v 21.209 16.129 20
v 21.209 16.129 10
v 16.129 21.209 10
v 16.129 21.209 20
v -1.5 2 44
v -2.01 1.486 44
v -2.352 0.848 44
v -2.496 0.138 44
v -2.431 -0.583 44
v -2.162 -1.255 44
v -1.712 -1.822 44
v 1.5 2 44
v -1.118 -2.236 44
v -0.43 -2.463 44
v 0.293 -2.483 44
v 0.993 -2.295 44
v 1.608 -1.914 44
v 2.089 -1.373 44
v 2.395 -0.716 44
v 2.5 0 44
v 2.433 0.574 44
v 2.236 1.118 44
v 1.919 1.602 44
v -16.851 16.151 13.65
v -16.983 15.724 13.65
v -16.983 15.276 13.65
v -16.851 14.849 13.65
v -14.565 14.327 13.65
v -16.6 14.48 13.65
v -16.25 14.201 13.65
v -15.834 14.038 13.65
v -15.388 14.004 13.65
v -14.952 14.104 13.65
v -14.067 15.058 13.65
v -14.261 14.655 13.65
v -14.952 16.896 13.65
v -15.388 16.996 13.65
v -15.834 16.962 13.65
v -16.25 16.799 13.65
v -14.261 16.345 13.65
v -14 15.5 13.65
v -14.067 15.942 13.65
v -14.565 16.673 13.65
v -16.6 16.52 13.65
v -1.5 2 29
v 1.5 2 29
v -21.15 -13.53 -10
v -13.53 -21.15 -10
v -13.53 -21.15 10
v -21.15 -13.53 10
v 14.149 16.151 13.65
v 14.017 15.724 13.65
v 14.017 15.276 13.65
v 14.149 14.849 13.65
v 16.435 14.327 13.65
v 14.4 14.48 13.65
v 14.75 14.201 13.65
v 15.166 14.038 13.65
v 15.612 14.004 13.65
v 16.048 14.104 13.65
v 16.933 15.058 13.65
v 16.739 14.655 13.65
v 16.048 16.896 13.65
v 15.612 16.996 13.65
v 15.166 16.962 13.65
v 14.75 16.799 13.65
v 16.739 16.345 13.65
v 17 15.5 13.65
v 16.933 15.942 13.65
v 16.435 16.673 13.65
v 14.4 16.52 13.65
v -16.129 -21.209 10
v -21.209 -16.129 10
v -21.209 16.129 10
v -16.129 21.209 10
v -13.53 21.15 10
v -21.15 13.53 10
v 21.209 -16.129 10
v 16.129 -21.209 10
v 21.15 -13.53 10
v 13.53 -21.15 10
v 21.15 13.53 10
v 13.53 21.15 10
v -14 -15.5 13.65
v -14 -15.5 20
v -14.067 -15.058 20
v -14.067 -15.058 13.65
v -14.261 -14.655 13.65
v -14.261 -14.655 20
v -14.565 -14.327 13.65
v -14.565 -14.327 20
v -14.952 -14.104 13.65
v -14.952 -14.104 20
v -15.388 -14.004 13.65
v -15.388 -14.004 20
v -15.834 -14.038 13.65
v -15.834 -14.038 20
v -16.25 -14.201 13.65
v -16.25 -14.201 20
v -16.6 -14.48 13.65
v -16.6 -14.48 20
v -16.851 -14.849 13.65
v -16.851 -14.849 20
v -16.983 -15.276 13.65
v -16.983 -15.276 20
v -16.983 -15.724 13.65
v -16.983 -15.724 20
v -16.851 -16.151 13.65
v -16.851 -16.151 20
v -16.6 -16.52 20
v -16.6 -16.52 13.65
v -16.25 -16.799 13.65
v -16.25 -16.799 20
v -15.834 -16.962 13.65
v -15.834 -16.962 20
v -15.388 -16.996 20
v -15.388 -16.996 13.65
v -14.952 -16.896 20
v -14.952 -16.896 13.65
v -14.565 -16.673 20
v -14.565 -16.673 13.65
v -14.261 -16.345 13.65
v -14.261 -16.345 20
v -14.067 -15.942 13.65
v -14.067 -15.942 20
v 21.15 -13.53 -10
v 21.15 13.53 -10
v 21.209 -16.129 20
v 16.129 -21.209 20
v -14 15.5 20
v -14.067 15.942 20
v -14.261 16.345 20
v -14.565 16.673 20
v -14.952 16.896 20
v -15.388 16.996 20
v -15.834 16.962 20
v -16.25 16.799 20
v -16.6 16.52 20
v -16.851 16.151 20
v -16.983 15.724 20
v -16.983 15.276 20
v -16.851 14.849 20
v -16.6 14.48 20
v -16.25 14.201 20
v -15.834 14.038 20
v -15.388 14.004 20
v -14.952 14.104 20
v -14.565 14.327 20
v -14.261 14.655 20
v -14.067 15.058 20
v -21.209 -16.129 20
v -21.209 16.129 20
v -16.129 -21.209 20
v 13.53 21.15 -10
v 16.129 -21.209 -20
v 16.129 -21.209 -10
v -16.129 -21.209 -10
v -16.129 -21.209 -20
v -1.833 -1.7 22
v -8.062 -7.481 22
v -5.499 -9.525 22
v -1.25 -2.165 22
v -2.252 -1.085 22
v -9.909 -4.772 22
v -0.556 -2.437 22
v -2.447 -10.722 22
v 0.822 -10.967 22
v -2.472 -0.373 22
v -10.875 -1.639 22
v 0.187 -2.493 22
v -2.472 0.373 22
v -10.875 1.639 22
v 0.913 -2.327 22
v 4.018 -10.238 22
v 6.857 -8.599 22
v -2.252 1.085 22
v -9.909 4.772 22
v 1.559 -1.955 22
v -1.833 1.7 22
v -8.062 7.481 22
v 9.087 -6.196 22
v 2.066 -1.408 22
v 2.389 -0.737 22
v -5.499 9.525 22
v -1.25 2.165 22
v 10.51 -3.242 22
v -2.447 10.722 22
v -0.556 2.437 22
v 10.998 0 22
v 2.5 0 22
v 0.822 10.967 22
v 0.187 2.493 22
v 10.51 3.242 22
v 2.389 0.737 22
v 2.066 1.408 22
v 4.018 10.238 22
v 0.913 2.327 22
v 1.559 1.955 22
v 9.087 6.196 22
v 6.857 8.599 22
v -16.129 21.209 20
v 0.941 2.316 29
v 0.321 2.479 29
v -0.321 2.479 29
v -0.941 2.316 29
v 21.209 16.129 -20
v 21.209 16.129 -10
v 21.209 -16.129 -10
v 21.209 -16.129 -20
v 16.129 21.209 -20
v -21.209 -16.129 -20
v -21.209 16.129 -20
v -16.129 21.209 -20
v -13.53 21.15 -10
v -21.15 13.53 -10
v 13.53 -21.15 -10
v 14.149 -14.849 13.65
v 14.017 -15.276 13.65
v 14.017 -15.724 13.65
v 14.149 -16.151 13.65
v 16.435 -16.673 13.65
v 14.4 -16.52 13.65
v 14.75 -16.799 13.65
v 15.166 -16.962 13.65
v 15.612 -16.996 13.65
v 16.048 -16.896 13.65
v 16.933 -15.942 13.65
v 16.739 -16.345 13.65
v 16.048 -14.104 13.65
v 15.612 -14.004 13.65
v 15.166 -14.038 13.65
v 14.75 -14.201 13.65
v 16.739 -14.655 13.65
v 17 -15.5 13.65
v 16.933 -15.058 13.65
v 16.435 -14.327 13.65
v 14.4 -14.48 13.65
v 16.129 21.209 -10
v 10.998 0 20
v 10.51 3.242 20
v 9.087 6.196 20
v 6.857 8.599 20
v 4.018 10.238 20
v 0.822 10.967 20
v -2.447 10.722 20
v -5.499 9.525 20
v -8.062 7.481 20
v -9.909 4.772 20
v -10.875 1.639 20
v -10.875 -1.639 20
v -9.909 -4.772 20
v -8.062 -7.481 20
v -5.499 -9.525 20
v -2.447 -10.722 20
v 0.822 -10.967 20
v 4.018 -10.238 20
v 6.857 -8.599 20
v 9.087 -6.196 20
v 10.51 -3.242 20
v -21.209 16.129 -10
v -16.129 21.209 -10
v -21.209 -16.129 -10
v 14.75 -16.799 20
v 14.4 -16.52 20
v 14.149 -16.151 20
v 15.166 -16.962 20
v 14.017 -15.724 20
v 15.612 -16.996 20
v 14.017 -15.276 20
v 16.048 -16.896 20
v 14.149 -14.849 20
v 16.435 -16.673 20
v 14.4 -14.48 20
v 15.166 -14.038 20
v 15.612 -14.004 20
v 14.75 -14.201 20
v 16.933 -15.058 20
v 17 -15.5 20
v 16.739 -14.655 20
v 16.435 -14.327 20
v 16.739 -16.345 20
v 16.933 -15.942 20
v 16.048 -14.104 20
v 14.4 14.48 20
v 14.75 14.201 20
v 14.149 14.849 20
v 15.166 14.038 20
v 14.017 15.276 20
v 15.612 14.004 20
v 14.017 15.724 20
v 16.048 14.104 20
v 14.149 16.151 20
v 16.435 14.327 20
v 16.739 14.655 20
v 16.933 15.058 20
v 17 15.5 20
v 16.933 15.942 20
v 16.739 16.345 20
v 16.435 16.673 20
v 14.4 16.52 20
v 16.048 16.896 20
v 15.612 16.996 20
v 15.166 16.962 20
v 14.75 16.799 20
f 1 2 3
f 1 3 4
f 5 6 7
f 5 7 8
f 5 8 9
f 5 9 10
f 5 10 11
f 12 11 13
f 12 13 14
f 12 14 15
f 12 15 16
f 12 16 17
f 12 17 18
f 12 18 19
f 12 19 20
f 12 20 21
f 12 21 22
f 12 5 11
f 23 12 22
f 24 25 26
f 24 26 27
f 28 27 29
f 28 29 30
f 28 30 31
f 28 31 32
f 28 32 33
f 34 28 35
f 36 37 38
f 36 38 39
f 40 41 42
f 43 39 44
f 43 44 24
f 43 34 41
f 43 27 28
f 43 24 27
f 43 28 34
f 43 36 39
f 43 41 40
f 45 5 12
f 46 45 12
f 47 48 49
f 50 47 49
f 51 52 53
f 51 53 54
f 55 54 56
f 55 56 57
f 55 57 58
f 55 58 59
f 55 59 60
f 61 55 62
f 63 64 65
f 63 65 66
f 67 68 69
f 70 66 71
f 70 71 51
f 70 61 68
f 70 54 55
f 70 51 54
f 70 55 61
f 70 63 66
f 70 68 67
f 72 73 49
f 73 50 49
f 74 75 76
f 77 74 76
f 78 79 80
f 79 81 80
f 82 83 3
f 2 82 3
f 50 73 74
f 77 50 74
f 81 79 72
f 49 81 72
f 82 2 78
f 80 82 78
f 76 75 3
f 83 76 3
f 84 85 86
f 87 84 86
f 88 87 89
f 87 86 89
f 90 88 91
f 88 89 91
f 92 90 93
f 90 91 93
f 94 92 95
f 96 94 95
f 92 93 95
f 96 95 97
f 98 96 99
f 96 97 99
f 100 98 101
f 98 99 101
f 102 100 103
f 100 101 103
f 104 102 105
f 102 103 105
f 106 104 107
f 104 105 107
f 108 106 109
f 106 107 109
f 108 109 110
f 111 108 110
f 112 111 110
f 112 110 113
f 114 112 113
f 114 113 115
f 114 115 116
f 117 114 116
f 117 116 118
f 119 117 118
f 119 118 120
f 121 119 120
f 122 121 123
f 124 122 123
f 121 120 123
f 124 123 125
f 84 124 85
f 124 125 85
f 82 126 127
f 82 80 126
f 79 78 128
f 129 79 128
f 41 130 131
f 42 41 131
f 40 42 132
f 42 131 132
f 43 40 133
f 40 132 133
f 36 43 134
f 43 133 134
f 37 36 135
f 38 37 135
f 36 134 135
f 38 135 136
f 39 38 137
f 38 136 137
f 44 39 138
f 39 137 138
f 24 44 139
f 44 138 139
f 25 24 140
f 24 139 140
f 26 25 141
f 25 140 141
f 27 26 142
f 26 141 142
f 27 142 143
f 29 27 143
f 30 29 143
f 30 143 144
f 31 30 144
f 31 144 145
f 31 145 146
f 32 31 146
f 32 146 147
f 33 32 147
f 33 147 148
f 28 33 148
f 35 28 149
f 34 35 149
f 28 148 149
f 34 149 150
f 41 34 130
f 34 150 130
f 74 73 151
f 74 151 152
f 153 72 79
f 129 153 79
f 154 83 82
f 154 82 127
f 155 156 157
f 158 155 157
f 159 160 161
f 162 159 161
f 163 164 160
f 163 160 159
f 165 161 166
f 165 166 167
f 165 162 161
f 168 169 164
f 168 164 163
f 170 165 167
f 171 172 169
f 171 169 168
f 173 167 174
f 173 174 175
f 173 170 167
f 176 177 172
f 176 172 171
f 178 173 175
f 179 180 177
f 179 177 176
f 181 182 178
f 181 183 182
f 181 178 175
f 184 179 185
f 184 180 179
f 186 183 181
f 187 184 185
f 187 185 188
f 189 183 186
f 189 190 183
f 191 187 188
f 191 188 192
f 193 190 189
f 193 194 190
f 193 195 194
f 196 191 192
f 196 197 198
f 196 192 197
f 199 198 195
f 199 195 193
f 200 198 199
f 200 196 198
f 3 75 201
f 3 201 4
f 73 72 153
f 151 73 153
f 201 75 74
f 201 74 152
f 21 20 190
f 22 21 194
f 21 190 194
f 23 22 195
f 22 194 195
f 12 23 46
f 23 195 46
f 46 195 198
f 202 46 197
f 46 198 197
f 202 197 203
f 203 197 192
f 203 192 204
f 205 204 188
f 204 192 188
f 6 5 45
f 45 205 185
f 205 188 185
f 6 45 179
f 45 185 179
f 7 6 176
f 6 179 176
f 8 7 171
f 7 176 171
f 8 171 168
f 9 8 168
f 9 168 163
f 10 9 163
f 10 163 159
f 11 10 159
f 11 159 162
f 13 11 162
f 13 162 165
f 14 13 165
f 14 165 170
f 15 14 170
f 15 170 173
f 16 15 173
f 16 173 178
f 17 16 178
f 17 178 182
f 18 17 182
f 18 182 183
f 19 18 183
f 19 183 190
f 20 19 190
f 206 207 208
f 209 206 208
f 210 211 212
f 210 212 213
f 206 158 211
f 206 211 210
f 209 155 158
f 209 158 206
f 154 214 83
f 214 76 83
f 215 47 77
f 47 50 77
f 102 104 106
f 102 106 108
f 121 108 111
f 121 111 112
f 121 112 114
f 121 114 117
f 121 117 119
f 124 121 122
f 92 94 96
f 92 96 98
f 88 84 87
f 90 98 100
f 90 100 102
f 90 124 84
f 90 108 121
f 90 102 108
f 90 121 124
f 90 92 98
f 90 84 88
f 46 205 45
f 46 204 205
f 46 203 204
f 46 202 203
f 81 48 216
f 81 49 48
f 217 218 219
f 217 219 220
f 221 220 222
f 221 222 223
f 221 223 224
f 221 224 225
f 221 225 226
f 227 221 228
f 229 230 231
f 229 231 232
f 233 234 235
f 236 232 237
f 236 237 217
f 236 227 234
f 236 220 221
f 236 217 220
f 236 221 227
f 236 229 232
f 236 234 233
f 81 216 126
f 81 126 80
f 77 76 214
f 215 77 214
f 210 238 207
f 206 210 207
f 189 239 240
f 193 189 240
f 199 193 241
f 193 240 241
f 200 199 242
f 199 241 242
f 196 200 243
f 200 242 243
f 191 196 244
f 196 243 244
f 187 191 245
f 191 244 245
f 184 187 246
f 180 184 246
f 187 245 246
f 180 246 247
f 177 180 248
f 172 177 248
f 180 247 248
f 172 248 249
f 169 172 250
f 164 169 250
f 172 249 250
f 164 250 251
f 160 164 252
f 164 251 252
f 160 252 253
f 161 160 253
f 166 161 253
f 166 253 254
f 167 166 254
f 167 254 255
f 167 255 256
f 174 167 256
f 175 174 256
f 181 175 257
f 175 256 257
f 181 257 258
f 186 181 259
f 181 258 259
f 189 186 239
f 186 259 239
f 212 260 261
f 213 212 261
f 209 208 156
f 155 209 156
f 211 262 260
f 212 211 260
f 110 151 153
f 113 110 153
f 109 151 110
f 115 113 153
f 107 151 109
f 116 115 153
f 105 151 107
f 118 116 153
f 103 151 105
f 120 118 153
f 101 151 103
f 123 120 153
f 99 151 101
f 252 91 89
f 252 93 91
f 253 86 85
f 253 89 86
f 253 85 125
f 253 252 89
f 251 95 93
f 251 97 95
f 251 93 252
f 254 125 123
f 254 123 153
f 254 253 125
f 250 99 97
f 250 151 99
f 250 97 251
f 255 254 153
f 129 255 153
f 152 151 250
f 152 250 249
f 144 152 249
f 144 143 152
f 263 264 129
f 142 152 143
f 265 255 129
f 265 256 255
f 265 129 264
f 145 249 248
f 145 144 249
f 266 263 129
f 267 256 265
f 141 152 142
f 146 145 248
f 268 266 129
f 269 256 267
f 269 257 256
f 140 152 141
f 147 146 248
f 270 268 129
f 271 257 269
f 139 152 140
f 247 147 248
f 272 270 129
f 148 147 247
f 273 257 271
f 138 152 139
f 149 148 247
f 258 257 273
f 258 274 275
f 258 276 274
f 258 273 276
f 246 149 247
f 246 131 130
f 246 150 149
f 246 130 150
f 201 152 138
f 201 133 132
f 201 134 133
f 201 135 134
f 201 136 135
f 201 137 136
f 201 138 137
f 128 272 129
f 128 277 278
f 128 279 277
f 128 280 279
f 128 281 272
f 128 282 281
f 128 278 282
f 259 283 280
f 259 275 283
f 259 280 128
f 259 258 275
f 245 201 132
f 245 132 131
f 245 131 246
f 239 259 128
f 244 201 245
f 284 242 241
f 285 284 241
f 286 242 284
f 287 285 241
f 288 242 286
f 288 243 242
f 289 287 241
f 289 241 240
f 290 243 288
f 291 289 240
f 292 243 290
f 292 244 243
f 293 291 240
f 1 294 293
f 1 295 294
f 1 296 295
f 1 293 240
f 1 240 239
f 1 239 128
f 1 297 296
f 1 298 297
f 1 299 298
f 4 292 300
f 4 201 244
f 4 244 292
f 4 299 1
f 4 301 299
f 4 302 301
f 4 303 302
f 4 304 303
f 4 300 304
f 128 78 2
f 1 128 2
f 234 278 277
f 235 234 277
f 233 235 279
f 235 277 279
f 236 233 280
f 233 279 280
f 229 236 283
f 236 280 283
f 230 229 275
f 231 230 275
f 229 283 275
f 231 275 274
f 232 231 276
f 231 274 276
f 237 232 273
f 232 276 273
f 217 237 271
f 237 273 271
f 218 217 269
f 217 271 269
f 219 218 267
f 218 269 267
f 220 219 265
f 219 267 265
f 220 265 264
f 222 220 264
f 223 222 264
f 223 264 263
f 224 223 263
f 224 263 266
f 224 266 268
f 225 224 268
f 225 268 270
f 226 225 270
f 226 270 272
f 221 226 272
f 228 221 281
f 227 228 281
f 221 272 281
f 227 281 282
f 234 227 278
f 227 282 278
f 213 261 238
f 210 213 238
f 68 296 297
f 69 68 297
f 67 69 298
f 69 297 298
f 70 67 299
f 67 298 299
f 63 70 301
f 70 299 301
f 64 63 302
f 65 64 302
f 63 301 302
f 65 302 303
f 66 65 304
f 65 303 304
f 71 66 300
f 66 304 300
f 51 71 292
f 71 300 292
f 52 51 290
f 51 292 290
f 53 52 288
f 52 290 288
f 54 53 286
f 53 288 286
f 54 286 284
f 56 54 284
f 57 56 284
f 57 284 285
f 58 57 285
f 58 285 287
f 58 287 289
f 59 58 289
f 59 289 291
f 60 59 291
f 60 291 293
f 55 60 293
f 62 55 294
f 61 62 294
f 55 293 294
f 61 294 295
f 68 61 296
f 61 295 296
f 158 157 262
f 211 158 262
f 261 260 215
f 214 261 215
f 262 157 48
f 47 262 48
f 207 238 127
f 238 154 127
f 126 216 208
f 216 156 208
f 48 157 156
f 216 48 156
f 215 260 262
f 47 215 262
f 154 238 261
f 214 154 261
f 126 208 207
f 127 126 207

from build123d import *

# Parameters (mm, degrees)
F0_W      = 42.3
F0_H      = 42.3
F1_DEPTH  = 10
F2_SIZE   = 7.62
F3_W      = 42.418
F3_H      = 42.418
F4_DEPTH  = 10
F5_SIZE   = 5.08
F7_DEPTH  = 10
F8_R      = 10.9982
F9_DEPTH  = 2
F10_R     = 2.5
F11_DEPTH = 22
F13_DEPTH = 15
F14_R     = 1.5
F15_DEPTH = 6.35


with BuildPart() as f1:
    # F0 (on Top) → F1 (new body, symmetric)
    with BuildSketch(Plane.XY):
        Rectangle(F0_W, F0_H)
    extrude(amount=F1_DEPTH, both=True)

    # F2
    f2_edges = [f1.edges().sort_by_distance(p)[0] for p in [
        (21.15, 21.15, 0),
        (-21.15, 21.15, 0),
        (-21.15, -21.15, 0),
        (21.15, -21.15, 0),
    ]]
    chamfer(f2_edges, length=F2_SIZE)

    # F3 (on face) → F4 (join)
    with BuildSketch(Plane.XY.offset(10)):
        Rectangle(F3_W, F3_H)
        Polygon((-13.53, 21.15), (13.53, 21.15), (21.15, 13.53), (21.15, -13.53), (13.53, -21.15), (-13.53, -21.15), (-21.15, -13.53), (-21.15, 13.53), align=None, mode=Mode.SUBTRACT)
        Polygon((21.15, 13.53), (13.53, 21.15), (-13.53, 21.15), (-21.15, 13.53), (-21.15, -13.53), (-13.53, -21.15), (13.53, -21.15), (21.15, -13.53), align=None)
    extrude(amount=F4_DEPTH)

    # F5
    f5_edges = [f1.edges().sort_by_distance(p)[0] for p in [
        (21.209, 21.209, 15),
        (-21.209, 21.209, 15),
        (-21.209, -21.209, 15),
        (21.209, -21.209, 15),
    ]]
    chamfer(f5_edges, length=F5_SIZE)

    # F6 (on face) → F7 (join)
    with BuildSketch(Plane(origin=(0, 0, -10), x_dir=(1, 0, 0), z_dir=(0, 0, -1))):
        Polygon((16.129, 21.209), (-16.129, 21.209), (-21.209, 16.129), (-21.209, -16.129), (-16.129, -21.209), (16.129, -21.209), (21.209, -16.129), (21.209, 16.129), align=None)
        Polygon((13.53, -21.15), (-13.53, -21.15), (-21.15, -13.53), (-21.15, 13.53), (-13.53, 21.15), (13.53, 21.15), (21.15, 13.53), (21.15, -13.53), align=None, mode=Mode.SUBTRACT)
        Polygon((-21.15, -13.53), (-13.53, -21.15), (13.53, -21.15), (21.15, -13.53), (21.15, 13.53), (13.53, 21.15), (-13.53, 21.15), (-21.15, 13.53), align=None)
    extrude(amount=F7_DEPTH)

    # F8 (on face) → F9 (join)
    with BuildSketch(Plane.XY.offset(20)):
        Circle(F8_R)
    extrude(amount=F9_DEPTH)

    # F10 (on face) → F11 (join)
    with BuildSketch(Plane.XY.offset(22)):
        Circle(F10_R)
    extrude(amount=F11_DEPTH)

    # F12 (on face) → F13 (cut)
    with BuildSketch(Plane.XY.offset(44)):
        with BuildLine():
            Line((2.6203631624, 2.9334036984), (-2.6333660554, 2.9334036984))
            Line((-2.6333660554, 2.9334036984), (-2.6333660554, 2))
            Line((-2.6333660554, 2), (-1.5, 2))
            ThreePointArc((-1.5, 2), (0, 2.5), (1.5, 2))
            Line((1.5, 2), (2.6203631624, 2))
            Line((2.6203631624, 2), (2.6203631624, 2.9334036984))
        make_face()
        with BuildLine():
            ThreePointArc((1.5, 2), (0, 2.5), (-1.5, 2))
            Line((-1.5, 2), (1.5, 2))
        make_face()
    extrude(amount=-F13_DEPTH, mode=Mode.SUBTRACT)

    # F14 (on face) → F15 (cut)
    with BuildSketch(Plane.XY.offset(20)):
        with Locations((-15.5, 15.5)):
            Circle(F14_R)
        with Locations((15.5, 15.5)):
            Circle(F14_R)
        with Locations((15.5, -15.5)):
            Circle(F14_R)
        with Locations((-15.5, -15.5)):
            Circle(F14_R)
    extrude(amount=-F15_DEPTH, mode=Mode.SUBTRACT)


solid = f1.part
